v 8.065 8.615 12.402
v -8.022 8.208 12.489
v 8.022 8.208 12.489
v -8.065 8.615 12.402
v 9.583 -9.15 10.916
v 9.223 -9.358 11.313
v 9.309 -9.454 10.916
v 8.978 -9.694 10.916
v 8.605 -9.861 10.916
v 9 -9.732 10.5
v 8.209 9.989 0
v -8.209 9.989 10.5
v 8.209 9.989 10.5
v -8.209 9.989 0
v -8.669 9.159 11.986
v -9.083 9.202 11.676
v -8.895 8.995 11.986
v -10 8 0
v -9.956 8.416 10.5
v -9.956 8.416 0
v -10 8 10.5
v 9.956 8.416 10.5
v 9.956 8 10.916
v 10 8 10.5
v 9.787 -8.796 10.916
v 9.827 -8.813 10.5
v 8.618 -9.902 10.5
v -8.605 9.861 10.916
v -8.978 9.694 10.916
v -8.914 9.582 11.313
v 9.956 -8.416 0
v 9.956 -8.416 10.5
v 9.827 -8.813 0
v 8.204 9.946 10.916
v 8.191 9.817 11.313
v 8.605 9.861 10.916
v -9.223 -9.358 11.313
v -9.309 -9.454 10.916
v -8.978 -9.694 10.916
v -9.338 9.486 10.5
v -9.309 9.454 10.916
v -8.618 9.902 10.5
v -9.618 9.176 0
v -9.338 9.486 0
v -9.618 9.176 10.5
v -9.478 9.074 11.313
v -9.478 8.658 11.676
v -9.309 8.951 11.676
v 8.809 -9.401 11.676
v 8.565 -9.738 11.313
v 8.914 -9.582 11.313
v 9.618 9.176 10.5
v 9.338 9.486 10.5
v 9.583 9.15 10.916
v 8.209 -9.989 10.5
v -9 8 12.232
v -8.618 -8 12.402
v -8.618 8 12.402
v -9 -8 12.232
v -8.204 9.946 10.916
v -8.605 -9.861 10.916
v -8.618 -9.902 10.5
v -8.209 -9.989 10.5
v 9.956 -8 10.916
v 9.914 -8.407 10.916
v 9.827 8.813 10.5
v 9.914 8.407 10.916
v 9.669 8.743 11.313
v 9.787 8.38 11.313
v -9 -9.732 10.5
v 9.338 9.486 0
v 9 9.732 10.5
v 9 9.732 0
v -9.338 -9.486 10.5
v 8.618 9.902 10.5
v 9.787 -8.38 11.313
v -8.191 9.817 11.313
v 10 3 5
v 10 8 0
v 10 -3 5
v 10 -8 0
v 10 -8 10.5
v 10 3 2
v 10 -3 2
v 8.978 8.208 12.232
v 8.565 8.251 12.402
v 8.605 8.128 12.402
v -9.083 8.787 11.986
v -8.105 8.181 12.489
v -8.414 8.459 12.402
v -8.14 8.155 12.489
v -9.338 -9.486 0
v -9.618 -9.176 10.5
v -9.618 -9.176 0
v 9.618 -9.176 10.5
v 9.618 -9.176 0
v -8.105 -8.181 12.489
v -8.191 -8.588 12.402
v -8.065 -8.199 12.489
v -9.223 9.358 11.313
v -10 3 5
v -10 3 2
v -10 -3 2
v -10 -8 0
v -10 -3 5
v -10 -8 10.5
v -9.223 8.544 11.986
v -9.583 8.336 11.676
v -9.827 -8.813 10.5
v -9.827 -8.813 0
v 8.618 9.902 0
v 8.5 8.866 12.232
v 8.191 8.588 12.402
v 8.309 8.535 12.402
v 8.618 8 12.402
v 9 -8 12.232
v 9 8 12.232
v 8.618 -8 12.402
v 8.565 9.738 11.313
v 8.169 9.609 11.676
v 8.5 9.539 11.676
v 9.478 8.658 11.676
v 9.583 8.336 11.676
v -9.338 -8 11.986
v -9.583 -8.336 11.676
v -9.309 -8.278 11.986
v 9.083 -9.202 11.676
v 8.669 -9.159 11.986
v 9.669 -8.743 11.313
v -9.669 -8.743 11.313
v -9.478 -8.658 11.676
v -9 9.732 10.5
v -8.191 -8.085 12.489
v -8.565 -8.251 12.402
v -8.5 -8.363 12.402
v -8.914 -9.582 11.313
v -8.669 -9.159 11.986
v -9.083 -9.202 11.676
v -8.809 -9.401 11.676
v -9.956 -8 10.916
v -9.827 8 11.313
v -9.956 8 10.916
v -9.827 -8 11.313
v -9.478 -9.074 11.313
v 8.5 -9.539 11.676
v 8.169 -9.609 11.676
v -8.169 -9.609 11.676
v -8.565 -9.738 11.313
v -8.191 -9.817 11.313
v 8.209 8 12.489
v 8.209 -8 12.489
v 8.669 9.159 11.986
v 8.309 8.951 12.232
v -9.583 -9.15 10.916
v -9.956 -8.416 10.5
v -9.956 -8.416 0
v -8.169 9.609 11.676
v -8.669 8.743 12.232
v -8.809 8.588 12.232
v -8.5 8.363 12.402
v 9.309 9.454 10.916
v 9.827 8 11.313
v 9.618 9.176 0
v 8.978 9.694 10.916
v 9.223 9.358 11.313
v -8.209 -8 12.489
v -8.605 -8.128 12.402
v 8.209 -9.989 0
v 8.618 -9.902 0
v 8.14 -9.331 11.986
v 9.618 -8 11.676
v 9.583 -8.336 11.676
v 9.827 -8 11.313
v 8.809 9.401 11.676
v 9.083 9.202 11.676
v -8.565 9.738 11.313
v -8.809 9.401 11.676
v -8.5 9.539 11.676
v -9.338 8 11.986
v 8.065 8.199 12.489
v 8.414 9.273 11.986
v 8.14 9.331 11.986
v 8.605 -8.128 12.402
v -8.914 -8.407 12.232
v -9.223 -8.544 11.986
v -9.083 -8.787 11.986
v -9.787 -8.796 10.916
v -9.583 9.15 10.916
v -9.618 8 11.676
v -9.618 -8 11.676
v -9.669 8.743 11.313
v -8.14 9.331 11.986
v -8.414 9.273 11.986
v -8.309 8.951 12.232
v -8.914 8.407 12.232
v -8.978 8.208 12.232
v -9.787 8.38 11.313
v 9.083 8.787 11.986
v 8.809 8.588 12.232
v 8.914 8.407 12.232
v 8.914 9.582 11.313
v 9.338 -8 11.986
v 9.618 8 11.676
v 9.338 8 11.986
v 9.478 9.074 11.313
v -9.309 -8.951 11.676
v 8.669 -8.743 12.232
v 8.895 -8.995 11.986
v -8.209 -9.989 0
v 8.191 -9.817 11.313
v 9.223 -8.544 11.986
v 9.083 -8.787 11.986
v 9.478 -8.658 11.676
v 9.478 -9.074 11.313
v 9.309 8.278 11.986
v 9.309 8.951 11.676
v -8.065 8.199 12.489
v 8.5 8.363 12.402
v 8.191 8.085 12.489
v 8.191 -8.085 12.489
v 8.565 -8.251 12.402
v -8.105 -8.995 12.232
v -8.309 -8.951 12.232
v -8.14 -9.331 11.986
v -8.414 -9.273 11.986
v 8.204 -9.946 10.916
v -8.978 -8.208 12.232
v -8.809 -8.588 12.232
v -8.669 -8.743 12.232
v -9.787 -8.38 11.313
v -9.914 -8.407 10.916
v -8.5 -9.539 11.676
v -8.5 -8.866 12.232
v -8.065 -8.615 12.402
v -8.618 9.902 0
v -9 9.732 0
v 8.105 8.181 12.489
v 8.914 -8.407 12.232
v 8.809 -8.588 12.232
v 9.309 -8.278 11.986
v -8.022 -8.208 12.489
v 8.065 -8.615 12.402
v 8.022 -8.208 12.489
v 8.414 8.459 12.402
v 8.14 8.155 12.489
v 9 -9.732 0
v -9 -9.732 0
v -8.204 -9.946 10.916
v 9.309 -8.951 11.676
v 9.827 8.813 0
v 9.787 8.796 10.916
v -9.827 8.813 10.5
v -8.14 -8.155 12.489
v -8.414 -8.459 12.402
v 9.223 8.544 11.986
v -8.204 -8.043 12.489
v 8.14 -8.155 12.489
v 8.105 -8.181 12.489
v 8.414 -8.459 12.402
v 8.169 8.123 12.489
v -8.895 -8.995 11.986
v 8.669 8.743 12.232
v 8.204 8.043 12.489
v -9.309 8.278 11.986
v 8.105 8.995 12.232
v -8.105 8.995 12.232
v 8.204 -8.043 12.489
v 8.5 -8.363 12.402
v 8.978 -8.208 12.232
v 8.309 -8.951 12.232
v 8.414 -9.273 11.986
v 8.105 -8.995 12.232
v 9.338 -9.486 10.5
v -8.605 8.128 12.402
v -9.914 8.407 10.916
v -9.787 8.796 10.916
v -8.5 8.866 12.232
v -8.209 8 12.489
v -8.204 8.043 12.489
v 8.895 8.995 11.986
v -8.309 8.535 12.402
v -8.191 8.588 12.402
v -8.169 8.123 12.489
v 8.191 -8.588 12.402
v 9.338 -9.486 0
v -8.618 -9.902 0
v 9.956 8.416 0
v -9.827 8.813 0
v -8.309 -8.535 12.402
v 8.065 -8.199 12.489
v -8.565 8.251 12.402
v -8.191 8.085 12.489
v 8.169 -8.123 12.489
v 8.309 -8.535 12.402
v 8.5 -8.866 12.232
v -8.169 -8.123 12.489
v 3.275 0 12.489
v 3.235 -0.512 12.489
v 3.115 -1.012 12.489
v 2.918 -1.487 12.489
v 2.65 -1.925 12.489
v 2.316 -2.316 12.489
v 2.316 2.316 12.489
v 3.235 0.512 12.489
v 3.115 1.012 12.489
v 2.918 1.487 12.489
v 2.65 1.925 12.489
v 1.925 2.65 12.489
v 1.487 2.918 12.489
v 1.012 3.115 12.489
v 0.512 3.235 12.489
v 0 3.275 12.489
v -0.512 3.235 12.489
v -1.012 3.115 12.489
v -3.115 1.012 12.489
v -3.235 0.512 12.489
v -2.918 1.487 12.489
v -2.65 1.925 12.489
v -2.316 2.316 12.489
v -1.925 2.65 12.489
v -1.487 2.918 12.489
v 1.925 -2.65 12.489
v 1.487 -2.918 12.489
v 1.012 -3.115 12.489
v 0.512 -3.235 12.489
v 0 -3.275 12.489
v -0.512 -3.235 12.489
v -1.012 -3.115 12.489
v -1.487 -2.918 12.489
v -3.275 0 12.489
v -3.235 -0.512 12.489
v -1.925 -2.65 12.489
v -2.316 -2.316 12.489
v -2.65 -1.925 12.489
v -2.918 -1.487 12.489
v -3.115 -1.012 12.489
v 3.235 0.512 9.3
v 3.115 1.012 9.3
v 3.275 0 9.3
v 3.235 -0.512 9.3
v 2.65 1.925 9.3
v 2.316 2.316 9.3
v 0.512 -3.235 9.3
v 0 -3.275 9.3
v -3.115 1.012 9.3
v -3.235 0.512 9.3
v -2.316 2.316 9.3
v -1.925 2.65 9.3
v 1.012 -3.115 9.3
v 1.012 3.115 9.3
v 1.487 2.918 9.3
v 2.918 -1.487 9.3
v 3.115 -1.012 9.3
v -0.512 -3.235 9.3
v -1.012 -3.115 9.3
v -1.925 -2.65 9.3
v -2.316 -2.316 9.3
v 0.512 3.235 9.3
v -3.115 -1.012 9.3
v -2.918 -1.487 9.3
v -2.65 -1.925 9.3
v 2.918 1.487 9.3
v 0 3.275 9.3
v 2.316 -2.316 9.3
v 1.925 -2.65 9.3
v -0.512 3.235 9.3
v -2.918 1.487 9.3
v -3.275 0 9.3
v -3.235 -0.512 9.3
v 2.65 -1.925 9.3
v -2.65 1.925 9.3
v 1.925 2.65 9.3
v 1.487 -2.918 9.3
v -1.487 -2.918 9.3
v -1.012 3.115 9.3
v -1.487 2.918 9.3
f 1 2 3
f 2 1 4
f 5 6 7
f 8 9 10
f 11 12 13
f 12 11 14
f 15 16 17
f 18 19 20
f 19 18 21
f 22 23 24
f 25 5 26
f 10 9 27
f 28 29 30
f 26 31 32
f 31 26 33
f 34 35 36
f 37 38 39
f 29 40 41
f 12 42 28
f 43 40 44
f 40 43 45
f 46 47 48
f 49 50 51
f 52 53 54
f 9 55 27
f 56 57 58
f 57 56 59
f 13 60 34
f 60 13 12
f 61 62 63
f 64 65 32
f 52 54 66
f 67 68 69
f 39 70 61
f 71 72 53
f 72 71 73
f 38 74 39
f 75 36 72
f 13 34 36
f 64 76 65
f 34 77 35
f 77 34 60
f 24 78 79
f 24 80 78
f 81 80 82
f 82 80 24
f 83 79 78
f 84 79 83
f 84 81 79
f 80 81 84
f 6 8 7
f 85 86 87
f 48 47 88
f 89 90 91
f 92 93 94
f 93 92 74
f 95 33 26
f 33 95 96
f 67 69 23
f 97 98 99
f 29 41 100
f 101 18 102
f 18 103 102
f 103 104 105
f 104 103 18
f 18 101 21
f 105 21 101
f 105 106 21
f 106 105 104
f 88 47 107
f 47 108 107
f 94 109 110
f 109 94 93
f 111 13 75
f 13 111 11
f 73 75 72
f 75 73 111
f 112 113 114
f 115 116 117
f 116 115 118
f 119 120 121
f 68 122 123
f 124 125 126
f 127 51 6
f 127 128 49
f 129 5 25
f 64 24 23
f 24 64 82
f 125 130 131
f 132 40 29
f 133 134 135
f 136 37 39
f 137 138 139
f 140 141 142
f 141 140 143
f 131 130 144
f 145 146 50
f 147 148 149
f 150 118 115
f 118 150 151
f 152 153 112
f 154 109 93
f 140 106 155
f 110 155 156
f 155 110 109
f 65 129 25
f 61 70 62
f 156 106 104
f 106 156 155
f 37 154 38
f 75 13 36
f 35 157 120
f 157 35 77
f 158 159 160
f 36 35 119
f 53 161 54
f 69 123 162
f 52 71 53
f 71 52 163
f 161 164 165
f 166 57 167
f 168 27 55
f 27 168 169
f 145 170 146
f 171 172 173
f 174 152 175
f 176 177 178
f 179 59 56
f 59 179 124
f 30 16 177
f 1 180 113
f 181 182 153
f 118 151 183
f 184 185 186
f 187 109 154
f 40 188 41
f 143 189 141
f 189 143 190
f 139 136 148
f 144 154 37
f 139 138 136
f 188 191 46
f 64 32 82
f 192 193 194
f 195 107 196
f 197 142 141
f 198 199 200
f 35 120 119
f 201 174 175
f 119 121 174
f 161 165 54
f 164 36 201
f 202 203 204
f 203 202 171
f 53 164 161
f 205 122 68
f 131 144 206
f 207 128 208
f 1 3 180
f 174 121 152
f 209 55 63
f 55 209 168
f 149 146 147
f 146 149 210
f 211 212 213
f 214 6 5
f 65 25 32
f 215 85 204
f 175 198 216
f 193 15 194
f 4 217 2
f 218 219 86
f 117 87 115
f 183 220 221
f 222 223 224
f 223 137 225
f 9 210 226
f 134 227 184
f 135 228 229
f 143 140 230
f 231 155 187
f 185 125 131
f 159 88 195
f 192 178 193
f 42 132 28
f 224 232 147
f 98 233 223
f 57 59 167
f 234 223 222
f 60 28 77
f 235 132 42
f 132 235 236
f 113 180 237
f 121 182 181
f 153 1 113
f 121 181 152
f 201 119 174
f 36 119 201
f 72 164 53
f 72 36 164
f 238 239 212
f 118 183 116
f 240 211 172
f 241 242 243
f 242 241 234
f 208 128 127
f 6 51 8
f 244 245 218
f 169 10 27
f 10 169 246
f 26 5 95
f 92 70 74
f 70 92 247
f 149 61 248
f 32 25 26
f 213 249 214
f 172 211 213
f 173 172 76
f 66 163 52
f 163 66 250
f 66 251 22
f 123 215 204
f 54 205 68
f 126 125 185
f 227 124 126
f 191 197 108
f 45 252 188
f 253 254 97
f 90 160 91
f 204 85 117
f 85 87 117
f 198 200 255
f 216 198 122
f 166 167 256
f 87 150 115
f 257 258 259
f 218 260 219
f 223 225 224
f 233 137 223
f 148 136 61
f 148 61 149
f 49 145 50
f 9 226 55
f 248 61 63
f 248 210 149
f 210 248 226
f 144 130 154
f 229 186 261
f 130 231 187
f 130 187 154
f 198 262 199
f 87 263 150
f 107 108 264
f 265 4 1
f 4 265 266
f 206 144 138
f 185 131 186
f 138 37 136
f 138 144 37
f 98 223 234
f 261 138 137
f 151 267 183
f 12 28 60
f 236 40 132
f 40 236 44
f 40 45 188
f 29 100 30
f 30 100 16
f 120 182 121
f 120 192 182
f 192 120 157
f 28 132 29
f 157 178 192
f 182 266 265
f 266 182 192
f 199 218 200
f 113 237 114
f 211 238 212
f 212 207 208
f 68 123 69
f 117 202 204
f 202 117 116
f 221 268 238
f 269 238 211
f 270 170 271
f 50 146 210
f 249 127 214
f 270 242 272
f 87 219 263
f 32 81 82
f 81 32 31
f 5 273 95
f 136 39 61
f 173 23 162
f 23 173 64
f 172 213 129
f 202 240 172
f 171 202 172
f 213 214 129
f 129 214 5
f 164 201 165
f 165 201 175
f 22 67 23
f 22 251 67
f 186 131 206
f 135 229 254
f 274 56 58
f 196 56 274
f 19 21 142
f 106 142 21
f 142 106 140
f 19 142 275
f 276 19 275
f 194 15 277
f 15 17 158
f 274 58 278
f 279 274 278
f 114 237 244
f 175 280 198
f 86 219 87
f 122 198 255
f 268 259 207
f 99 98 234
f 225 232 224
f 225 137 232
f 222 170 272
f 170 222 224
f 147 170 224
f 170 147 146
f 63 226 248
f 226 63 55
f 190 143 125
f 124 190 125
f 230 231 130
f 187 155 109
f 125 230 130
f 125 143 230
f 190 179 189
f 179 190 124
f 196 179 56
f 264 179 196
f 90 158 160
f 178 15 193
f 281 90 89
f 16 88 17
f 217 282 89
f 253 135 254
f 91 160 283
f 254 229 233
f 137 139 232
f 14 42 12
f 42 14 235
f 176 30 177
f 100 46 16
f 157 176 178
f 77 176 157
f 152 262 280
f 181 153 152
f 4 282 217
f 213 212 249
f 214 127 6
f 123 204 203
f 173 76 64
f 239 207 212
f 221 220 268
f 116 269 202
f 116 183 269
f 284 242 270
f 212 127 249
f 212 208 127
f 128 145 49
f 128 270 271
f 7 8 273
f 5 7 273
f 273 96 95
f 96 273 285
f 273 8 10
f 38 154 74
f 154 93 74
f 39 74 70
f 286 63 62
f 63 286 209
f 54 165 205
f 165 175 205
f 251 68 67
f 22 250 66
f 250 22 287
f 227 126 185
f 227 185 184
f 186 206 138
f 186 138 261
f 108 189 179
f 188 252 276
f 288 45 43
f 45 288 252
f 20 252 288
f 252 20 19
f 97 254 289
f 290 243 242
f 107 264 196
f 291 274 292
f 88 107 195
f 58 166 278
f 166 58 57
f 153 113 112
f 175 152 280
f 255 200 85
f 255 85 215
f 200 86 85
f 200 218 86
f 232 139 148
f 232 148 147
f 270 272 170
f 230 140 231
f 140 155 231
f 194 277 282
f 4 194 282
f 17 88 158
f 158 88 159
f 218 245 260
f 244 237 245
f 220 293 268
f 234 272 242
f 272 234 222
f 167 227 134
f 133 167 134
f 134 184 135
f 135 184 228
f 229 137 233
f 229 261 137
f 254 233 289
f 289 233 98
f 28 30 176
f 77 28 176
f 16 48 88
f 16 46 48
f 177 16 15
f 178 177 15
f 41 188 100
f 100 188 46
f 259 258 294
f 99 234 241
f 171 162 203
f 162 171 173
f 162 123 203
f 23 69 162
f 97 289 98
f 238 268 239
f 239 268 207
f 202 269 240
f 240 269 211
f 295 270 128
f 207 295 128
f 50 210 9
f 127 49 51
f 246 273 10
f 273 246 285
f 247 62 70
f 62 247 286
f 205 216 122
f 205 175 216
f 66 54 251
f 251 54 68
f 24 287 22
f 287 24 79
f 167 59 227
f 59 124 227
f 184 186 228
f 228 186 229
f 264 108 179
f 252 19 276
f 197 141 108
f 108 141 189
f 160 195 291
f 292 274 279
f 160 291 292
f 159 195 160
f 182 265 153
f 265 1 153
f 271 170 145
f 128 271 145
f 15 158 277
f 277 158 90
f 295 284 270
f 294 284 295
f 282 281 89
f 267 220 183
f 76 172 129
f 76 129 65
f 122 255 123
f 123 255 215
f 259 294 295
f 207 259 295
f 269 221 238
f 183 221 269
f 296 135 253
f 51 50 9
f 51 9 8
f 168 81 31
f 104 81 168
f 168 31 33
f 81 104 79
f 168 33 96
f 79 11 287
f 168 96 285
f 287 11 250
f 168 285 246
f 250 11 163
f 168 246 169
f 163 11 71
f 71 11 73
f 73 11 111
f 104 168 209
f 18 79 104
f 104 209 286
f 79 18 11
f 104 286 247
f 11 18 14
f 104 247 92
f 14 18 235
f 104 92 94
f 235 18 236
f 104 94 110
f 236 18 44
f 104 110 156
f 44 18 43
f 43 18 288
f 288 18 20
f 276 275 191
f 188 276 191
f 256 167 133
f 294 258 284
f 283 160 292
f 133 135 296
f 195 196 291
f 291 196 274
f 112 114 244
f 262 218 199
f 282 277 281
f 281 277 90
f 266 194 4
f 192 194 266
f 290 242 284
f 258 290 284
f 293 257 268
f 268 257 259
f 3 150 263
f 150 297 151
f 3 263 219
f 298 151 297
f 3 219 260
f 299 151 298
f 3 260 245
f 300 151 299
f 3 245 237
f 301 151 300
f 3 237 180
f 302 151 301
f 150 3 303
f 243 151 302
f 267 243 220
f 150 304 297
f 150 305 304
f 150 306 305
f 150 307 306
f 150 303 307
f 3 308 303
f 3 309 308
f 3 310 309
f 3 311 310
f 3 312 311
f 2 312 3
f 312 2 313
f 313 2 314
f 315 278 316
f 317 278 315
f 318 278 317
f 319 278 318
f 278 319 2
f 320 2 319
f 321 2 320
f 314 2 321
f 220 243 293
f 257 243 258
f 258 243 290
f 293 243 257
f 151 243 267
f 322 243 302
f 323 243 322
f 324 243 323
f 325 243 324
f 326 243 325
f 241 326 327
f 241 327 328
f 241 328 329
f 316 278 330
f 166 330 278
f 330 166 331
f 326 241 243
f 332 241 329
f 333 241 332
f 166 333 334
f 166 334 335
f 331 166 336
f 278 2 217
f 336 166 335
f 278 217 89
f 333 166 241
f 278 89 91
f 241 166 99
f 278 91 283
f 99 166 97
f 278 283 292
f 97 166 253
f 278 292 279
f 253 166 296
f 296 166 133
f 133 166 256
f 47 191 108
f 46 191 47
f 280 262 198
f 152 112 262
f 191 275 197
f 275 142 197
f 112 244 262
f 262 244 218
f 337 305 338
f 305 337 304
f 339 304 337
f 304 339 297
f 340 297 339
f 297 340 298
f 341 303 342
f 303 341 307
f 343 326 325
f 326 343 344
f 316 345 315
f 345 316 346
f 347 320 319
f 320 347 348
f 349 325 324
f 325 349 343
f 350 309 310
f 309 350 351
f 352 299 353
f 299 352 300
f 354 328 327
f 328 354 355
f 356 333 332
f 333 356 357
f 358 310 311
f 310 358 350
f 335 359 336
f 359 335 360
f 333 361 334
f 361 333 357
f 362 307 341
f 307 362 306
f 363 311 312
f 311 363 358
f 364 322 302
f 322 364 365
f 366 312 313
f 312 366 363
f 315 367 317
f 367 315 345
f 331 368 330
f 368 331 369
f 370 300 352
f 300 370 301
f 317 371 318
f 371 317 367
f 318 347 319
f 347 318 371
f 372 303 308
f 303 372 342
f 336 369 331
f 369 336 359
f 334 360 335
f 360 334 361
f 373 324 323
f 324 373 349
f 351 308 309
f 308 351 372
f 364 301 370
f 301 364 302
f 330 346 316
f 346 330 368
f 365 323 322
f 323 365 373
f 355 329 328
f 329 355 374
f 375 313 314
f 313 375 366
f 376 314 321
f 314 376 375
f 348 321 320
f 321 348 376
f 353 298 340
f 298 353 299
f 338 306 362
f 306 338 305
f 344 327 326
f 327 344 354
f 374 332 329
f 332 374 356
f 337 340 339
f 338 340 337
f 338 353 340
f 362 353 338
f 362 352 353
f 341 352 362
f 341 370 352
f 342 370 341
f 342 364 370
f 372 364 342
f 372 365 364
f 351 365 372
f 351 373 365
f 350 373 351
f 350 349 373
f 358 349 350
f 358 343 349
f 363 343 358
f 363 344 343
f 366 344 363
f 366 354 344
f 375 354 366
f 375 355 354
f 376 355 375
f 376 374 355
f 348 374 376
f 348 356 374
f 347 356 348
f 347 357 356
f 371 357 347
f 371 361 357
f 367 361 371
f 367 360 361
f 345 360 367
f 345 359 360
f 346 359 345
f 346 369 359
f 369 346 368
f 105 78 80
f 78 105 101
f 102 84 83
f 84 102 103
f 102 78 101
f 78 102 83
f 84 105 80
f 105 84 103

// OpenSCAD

//distance between inside of crank and surface of magnet.
crank_offset=12.5;
//diameter of magnet in mm.  Add about 0.2mm extra to ensure a tigth but not impossible fit.
magnet_diameter=6.55;
//height of magnet in mm
magnet_height=3.2;


difference() {
	translate([-10,-10])
	  v_rounded_cube([20,20,crank_offset],2);
	//magnet hole
	translate([0,0,crank_offset-magnet_height ])
		cylinder(h=magnet_height,d=magnet_diameter,$fn=40);
	//cabletie hole
	translate([-50,-3 ,2 ]) cube([100,6,3]);
}
module v_rounded_cube(xyz,r,$fn=30) {
	z = xyz[2];
	y = xyz[1];
	x = xyz[0];
	translate([r,r])
	hull() {
		cylinder(h=z-r,r=r);
		translate([0,y-2*r])
		cylinder(h=z-r,r=r);
		translate([x-2*r,0])
		cylinder(h=z-r,r=r);
		translate([x-2*r,y-2*r])
		cylinder(h=z-r,r=r);
		translate([0,0,z-r])
		sphere(r);
		translate([0,y-2*r,z-r])
		sphere(r);
		translate([x-2*r,0,z-r])
		sphere(r);
		translate([x-2*r,y-2*r,z-r])
		sphere(r);
	}
}
